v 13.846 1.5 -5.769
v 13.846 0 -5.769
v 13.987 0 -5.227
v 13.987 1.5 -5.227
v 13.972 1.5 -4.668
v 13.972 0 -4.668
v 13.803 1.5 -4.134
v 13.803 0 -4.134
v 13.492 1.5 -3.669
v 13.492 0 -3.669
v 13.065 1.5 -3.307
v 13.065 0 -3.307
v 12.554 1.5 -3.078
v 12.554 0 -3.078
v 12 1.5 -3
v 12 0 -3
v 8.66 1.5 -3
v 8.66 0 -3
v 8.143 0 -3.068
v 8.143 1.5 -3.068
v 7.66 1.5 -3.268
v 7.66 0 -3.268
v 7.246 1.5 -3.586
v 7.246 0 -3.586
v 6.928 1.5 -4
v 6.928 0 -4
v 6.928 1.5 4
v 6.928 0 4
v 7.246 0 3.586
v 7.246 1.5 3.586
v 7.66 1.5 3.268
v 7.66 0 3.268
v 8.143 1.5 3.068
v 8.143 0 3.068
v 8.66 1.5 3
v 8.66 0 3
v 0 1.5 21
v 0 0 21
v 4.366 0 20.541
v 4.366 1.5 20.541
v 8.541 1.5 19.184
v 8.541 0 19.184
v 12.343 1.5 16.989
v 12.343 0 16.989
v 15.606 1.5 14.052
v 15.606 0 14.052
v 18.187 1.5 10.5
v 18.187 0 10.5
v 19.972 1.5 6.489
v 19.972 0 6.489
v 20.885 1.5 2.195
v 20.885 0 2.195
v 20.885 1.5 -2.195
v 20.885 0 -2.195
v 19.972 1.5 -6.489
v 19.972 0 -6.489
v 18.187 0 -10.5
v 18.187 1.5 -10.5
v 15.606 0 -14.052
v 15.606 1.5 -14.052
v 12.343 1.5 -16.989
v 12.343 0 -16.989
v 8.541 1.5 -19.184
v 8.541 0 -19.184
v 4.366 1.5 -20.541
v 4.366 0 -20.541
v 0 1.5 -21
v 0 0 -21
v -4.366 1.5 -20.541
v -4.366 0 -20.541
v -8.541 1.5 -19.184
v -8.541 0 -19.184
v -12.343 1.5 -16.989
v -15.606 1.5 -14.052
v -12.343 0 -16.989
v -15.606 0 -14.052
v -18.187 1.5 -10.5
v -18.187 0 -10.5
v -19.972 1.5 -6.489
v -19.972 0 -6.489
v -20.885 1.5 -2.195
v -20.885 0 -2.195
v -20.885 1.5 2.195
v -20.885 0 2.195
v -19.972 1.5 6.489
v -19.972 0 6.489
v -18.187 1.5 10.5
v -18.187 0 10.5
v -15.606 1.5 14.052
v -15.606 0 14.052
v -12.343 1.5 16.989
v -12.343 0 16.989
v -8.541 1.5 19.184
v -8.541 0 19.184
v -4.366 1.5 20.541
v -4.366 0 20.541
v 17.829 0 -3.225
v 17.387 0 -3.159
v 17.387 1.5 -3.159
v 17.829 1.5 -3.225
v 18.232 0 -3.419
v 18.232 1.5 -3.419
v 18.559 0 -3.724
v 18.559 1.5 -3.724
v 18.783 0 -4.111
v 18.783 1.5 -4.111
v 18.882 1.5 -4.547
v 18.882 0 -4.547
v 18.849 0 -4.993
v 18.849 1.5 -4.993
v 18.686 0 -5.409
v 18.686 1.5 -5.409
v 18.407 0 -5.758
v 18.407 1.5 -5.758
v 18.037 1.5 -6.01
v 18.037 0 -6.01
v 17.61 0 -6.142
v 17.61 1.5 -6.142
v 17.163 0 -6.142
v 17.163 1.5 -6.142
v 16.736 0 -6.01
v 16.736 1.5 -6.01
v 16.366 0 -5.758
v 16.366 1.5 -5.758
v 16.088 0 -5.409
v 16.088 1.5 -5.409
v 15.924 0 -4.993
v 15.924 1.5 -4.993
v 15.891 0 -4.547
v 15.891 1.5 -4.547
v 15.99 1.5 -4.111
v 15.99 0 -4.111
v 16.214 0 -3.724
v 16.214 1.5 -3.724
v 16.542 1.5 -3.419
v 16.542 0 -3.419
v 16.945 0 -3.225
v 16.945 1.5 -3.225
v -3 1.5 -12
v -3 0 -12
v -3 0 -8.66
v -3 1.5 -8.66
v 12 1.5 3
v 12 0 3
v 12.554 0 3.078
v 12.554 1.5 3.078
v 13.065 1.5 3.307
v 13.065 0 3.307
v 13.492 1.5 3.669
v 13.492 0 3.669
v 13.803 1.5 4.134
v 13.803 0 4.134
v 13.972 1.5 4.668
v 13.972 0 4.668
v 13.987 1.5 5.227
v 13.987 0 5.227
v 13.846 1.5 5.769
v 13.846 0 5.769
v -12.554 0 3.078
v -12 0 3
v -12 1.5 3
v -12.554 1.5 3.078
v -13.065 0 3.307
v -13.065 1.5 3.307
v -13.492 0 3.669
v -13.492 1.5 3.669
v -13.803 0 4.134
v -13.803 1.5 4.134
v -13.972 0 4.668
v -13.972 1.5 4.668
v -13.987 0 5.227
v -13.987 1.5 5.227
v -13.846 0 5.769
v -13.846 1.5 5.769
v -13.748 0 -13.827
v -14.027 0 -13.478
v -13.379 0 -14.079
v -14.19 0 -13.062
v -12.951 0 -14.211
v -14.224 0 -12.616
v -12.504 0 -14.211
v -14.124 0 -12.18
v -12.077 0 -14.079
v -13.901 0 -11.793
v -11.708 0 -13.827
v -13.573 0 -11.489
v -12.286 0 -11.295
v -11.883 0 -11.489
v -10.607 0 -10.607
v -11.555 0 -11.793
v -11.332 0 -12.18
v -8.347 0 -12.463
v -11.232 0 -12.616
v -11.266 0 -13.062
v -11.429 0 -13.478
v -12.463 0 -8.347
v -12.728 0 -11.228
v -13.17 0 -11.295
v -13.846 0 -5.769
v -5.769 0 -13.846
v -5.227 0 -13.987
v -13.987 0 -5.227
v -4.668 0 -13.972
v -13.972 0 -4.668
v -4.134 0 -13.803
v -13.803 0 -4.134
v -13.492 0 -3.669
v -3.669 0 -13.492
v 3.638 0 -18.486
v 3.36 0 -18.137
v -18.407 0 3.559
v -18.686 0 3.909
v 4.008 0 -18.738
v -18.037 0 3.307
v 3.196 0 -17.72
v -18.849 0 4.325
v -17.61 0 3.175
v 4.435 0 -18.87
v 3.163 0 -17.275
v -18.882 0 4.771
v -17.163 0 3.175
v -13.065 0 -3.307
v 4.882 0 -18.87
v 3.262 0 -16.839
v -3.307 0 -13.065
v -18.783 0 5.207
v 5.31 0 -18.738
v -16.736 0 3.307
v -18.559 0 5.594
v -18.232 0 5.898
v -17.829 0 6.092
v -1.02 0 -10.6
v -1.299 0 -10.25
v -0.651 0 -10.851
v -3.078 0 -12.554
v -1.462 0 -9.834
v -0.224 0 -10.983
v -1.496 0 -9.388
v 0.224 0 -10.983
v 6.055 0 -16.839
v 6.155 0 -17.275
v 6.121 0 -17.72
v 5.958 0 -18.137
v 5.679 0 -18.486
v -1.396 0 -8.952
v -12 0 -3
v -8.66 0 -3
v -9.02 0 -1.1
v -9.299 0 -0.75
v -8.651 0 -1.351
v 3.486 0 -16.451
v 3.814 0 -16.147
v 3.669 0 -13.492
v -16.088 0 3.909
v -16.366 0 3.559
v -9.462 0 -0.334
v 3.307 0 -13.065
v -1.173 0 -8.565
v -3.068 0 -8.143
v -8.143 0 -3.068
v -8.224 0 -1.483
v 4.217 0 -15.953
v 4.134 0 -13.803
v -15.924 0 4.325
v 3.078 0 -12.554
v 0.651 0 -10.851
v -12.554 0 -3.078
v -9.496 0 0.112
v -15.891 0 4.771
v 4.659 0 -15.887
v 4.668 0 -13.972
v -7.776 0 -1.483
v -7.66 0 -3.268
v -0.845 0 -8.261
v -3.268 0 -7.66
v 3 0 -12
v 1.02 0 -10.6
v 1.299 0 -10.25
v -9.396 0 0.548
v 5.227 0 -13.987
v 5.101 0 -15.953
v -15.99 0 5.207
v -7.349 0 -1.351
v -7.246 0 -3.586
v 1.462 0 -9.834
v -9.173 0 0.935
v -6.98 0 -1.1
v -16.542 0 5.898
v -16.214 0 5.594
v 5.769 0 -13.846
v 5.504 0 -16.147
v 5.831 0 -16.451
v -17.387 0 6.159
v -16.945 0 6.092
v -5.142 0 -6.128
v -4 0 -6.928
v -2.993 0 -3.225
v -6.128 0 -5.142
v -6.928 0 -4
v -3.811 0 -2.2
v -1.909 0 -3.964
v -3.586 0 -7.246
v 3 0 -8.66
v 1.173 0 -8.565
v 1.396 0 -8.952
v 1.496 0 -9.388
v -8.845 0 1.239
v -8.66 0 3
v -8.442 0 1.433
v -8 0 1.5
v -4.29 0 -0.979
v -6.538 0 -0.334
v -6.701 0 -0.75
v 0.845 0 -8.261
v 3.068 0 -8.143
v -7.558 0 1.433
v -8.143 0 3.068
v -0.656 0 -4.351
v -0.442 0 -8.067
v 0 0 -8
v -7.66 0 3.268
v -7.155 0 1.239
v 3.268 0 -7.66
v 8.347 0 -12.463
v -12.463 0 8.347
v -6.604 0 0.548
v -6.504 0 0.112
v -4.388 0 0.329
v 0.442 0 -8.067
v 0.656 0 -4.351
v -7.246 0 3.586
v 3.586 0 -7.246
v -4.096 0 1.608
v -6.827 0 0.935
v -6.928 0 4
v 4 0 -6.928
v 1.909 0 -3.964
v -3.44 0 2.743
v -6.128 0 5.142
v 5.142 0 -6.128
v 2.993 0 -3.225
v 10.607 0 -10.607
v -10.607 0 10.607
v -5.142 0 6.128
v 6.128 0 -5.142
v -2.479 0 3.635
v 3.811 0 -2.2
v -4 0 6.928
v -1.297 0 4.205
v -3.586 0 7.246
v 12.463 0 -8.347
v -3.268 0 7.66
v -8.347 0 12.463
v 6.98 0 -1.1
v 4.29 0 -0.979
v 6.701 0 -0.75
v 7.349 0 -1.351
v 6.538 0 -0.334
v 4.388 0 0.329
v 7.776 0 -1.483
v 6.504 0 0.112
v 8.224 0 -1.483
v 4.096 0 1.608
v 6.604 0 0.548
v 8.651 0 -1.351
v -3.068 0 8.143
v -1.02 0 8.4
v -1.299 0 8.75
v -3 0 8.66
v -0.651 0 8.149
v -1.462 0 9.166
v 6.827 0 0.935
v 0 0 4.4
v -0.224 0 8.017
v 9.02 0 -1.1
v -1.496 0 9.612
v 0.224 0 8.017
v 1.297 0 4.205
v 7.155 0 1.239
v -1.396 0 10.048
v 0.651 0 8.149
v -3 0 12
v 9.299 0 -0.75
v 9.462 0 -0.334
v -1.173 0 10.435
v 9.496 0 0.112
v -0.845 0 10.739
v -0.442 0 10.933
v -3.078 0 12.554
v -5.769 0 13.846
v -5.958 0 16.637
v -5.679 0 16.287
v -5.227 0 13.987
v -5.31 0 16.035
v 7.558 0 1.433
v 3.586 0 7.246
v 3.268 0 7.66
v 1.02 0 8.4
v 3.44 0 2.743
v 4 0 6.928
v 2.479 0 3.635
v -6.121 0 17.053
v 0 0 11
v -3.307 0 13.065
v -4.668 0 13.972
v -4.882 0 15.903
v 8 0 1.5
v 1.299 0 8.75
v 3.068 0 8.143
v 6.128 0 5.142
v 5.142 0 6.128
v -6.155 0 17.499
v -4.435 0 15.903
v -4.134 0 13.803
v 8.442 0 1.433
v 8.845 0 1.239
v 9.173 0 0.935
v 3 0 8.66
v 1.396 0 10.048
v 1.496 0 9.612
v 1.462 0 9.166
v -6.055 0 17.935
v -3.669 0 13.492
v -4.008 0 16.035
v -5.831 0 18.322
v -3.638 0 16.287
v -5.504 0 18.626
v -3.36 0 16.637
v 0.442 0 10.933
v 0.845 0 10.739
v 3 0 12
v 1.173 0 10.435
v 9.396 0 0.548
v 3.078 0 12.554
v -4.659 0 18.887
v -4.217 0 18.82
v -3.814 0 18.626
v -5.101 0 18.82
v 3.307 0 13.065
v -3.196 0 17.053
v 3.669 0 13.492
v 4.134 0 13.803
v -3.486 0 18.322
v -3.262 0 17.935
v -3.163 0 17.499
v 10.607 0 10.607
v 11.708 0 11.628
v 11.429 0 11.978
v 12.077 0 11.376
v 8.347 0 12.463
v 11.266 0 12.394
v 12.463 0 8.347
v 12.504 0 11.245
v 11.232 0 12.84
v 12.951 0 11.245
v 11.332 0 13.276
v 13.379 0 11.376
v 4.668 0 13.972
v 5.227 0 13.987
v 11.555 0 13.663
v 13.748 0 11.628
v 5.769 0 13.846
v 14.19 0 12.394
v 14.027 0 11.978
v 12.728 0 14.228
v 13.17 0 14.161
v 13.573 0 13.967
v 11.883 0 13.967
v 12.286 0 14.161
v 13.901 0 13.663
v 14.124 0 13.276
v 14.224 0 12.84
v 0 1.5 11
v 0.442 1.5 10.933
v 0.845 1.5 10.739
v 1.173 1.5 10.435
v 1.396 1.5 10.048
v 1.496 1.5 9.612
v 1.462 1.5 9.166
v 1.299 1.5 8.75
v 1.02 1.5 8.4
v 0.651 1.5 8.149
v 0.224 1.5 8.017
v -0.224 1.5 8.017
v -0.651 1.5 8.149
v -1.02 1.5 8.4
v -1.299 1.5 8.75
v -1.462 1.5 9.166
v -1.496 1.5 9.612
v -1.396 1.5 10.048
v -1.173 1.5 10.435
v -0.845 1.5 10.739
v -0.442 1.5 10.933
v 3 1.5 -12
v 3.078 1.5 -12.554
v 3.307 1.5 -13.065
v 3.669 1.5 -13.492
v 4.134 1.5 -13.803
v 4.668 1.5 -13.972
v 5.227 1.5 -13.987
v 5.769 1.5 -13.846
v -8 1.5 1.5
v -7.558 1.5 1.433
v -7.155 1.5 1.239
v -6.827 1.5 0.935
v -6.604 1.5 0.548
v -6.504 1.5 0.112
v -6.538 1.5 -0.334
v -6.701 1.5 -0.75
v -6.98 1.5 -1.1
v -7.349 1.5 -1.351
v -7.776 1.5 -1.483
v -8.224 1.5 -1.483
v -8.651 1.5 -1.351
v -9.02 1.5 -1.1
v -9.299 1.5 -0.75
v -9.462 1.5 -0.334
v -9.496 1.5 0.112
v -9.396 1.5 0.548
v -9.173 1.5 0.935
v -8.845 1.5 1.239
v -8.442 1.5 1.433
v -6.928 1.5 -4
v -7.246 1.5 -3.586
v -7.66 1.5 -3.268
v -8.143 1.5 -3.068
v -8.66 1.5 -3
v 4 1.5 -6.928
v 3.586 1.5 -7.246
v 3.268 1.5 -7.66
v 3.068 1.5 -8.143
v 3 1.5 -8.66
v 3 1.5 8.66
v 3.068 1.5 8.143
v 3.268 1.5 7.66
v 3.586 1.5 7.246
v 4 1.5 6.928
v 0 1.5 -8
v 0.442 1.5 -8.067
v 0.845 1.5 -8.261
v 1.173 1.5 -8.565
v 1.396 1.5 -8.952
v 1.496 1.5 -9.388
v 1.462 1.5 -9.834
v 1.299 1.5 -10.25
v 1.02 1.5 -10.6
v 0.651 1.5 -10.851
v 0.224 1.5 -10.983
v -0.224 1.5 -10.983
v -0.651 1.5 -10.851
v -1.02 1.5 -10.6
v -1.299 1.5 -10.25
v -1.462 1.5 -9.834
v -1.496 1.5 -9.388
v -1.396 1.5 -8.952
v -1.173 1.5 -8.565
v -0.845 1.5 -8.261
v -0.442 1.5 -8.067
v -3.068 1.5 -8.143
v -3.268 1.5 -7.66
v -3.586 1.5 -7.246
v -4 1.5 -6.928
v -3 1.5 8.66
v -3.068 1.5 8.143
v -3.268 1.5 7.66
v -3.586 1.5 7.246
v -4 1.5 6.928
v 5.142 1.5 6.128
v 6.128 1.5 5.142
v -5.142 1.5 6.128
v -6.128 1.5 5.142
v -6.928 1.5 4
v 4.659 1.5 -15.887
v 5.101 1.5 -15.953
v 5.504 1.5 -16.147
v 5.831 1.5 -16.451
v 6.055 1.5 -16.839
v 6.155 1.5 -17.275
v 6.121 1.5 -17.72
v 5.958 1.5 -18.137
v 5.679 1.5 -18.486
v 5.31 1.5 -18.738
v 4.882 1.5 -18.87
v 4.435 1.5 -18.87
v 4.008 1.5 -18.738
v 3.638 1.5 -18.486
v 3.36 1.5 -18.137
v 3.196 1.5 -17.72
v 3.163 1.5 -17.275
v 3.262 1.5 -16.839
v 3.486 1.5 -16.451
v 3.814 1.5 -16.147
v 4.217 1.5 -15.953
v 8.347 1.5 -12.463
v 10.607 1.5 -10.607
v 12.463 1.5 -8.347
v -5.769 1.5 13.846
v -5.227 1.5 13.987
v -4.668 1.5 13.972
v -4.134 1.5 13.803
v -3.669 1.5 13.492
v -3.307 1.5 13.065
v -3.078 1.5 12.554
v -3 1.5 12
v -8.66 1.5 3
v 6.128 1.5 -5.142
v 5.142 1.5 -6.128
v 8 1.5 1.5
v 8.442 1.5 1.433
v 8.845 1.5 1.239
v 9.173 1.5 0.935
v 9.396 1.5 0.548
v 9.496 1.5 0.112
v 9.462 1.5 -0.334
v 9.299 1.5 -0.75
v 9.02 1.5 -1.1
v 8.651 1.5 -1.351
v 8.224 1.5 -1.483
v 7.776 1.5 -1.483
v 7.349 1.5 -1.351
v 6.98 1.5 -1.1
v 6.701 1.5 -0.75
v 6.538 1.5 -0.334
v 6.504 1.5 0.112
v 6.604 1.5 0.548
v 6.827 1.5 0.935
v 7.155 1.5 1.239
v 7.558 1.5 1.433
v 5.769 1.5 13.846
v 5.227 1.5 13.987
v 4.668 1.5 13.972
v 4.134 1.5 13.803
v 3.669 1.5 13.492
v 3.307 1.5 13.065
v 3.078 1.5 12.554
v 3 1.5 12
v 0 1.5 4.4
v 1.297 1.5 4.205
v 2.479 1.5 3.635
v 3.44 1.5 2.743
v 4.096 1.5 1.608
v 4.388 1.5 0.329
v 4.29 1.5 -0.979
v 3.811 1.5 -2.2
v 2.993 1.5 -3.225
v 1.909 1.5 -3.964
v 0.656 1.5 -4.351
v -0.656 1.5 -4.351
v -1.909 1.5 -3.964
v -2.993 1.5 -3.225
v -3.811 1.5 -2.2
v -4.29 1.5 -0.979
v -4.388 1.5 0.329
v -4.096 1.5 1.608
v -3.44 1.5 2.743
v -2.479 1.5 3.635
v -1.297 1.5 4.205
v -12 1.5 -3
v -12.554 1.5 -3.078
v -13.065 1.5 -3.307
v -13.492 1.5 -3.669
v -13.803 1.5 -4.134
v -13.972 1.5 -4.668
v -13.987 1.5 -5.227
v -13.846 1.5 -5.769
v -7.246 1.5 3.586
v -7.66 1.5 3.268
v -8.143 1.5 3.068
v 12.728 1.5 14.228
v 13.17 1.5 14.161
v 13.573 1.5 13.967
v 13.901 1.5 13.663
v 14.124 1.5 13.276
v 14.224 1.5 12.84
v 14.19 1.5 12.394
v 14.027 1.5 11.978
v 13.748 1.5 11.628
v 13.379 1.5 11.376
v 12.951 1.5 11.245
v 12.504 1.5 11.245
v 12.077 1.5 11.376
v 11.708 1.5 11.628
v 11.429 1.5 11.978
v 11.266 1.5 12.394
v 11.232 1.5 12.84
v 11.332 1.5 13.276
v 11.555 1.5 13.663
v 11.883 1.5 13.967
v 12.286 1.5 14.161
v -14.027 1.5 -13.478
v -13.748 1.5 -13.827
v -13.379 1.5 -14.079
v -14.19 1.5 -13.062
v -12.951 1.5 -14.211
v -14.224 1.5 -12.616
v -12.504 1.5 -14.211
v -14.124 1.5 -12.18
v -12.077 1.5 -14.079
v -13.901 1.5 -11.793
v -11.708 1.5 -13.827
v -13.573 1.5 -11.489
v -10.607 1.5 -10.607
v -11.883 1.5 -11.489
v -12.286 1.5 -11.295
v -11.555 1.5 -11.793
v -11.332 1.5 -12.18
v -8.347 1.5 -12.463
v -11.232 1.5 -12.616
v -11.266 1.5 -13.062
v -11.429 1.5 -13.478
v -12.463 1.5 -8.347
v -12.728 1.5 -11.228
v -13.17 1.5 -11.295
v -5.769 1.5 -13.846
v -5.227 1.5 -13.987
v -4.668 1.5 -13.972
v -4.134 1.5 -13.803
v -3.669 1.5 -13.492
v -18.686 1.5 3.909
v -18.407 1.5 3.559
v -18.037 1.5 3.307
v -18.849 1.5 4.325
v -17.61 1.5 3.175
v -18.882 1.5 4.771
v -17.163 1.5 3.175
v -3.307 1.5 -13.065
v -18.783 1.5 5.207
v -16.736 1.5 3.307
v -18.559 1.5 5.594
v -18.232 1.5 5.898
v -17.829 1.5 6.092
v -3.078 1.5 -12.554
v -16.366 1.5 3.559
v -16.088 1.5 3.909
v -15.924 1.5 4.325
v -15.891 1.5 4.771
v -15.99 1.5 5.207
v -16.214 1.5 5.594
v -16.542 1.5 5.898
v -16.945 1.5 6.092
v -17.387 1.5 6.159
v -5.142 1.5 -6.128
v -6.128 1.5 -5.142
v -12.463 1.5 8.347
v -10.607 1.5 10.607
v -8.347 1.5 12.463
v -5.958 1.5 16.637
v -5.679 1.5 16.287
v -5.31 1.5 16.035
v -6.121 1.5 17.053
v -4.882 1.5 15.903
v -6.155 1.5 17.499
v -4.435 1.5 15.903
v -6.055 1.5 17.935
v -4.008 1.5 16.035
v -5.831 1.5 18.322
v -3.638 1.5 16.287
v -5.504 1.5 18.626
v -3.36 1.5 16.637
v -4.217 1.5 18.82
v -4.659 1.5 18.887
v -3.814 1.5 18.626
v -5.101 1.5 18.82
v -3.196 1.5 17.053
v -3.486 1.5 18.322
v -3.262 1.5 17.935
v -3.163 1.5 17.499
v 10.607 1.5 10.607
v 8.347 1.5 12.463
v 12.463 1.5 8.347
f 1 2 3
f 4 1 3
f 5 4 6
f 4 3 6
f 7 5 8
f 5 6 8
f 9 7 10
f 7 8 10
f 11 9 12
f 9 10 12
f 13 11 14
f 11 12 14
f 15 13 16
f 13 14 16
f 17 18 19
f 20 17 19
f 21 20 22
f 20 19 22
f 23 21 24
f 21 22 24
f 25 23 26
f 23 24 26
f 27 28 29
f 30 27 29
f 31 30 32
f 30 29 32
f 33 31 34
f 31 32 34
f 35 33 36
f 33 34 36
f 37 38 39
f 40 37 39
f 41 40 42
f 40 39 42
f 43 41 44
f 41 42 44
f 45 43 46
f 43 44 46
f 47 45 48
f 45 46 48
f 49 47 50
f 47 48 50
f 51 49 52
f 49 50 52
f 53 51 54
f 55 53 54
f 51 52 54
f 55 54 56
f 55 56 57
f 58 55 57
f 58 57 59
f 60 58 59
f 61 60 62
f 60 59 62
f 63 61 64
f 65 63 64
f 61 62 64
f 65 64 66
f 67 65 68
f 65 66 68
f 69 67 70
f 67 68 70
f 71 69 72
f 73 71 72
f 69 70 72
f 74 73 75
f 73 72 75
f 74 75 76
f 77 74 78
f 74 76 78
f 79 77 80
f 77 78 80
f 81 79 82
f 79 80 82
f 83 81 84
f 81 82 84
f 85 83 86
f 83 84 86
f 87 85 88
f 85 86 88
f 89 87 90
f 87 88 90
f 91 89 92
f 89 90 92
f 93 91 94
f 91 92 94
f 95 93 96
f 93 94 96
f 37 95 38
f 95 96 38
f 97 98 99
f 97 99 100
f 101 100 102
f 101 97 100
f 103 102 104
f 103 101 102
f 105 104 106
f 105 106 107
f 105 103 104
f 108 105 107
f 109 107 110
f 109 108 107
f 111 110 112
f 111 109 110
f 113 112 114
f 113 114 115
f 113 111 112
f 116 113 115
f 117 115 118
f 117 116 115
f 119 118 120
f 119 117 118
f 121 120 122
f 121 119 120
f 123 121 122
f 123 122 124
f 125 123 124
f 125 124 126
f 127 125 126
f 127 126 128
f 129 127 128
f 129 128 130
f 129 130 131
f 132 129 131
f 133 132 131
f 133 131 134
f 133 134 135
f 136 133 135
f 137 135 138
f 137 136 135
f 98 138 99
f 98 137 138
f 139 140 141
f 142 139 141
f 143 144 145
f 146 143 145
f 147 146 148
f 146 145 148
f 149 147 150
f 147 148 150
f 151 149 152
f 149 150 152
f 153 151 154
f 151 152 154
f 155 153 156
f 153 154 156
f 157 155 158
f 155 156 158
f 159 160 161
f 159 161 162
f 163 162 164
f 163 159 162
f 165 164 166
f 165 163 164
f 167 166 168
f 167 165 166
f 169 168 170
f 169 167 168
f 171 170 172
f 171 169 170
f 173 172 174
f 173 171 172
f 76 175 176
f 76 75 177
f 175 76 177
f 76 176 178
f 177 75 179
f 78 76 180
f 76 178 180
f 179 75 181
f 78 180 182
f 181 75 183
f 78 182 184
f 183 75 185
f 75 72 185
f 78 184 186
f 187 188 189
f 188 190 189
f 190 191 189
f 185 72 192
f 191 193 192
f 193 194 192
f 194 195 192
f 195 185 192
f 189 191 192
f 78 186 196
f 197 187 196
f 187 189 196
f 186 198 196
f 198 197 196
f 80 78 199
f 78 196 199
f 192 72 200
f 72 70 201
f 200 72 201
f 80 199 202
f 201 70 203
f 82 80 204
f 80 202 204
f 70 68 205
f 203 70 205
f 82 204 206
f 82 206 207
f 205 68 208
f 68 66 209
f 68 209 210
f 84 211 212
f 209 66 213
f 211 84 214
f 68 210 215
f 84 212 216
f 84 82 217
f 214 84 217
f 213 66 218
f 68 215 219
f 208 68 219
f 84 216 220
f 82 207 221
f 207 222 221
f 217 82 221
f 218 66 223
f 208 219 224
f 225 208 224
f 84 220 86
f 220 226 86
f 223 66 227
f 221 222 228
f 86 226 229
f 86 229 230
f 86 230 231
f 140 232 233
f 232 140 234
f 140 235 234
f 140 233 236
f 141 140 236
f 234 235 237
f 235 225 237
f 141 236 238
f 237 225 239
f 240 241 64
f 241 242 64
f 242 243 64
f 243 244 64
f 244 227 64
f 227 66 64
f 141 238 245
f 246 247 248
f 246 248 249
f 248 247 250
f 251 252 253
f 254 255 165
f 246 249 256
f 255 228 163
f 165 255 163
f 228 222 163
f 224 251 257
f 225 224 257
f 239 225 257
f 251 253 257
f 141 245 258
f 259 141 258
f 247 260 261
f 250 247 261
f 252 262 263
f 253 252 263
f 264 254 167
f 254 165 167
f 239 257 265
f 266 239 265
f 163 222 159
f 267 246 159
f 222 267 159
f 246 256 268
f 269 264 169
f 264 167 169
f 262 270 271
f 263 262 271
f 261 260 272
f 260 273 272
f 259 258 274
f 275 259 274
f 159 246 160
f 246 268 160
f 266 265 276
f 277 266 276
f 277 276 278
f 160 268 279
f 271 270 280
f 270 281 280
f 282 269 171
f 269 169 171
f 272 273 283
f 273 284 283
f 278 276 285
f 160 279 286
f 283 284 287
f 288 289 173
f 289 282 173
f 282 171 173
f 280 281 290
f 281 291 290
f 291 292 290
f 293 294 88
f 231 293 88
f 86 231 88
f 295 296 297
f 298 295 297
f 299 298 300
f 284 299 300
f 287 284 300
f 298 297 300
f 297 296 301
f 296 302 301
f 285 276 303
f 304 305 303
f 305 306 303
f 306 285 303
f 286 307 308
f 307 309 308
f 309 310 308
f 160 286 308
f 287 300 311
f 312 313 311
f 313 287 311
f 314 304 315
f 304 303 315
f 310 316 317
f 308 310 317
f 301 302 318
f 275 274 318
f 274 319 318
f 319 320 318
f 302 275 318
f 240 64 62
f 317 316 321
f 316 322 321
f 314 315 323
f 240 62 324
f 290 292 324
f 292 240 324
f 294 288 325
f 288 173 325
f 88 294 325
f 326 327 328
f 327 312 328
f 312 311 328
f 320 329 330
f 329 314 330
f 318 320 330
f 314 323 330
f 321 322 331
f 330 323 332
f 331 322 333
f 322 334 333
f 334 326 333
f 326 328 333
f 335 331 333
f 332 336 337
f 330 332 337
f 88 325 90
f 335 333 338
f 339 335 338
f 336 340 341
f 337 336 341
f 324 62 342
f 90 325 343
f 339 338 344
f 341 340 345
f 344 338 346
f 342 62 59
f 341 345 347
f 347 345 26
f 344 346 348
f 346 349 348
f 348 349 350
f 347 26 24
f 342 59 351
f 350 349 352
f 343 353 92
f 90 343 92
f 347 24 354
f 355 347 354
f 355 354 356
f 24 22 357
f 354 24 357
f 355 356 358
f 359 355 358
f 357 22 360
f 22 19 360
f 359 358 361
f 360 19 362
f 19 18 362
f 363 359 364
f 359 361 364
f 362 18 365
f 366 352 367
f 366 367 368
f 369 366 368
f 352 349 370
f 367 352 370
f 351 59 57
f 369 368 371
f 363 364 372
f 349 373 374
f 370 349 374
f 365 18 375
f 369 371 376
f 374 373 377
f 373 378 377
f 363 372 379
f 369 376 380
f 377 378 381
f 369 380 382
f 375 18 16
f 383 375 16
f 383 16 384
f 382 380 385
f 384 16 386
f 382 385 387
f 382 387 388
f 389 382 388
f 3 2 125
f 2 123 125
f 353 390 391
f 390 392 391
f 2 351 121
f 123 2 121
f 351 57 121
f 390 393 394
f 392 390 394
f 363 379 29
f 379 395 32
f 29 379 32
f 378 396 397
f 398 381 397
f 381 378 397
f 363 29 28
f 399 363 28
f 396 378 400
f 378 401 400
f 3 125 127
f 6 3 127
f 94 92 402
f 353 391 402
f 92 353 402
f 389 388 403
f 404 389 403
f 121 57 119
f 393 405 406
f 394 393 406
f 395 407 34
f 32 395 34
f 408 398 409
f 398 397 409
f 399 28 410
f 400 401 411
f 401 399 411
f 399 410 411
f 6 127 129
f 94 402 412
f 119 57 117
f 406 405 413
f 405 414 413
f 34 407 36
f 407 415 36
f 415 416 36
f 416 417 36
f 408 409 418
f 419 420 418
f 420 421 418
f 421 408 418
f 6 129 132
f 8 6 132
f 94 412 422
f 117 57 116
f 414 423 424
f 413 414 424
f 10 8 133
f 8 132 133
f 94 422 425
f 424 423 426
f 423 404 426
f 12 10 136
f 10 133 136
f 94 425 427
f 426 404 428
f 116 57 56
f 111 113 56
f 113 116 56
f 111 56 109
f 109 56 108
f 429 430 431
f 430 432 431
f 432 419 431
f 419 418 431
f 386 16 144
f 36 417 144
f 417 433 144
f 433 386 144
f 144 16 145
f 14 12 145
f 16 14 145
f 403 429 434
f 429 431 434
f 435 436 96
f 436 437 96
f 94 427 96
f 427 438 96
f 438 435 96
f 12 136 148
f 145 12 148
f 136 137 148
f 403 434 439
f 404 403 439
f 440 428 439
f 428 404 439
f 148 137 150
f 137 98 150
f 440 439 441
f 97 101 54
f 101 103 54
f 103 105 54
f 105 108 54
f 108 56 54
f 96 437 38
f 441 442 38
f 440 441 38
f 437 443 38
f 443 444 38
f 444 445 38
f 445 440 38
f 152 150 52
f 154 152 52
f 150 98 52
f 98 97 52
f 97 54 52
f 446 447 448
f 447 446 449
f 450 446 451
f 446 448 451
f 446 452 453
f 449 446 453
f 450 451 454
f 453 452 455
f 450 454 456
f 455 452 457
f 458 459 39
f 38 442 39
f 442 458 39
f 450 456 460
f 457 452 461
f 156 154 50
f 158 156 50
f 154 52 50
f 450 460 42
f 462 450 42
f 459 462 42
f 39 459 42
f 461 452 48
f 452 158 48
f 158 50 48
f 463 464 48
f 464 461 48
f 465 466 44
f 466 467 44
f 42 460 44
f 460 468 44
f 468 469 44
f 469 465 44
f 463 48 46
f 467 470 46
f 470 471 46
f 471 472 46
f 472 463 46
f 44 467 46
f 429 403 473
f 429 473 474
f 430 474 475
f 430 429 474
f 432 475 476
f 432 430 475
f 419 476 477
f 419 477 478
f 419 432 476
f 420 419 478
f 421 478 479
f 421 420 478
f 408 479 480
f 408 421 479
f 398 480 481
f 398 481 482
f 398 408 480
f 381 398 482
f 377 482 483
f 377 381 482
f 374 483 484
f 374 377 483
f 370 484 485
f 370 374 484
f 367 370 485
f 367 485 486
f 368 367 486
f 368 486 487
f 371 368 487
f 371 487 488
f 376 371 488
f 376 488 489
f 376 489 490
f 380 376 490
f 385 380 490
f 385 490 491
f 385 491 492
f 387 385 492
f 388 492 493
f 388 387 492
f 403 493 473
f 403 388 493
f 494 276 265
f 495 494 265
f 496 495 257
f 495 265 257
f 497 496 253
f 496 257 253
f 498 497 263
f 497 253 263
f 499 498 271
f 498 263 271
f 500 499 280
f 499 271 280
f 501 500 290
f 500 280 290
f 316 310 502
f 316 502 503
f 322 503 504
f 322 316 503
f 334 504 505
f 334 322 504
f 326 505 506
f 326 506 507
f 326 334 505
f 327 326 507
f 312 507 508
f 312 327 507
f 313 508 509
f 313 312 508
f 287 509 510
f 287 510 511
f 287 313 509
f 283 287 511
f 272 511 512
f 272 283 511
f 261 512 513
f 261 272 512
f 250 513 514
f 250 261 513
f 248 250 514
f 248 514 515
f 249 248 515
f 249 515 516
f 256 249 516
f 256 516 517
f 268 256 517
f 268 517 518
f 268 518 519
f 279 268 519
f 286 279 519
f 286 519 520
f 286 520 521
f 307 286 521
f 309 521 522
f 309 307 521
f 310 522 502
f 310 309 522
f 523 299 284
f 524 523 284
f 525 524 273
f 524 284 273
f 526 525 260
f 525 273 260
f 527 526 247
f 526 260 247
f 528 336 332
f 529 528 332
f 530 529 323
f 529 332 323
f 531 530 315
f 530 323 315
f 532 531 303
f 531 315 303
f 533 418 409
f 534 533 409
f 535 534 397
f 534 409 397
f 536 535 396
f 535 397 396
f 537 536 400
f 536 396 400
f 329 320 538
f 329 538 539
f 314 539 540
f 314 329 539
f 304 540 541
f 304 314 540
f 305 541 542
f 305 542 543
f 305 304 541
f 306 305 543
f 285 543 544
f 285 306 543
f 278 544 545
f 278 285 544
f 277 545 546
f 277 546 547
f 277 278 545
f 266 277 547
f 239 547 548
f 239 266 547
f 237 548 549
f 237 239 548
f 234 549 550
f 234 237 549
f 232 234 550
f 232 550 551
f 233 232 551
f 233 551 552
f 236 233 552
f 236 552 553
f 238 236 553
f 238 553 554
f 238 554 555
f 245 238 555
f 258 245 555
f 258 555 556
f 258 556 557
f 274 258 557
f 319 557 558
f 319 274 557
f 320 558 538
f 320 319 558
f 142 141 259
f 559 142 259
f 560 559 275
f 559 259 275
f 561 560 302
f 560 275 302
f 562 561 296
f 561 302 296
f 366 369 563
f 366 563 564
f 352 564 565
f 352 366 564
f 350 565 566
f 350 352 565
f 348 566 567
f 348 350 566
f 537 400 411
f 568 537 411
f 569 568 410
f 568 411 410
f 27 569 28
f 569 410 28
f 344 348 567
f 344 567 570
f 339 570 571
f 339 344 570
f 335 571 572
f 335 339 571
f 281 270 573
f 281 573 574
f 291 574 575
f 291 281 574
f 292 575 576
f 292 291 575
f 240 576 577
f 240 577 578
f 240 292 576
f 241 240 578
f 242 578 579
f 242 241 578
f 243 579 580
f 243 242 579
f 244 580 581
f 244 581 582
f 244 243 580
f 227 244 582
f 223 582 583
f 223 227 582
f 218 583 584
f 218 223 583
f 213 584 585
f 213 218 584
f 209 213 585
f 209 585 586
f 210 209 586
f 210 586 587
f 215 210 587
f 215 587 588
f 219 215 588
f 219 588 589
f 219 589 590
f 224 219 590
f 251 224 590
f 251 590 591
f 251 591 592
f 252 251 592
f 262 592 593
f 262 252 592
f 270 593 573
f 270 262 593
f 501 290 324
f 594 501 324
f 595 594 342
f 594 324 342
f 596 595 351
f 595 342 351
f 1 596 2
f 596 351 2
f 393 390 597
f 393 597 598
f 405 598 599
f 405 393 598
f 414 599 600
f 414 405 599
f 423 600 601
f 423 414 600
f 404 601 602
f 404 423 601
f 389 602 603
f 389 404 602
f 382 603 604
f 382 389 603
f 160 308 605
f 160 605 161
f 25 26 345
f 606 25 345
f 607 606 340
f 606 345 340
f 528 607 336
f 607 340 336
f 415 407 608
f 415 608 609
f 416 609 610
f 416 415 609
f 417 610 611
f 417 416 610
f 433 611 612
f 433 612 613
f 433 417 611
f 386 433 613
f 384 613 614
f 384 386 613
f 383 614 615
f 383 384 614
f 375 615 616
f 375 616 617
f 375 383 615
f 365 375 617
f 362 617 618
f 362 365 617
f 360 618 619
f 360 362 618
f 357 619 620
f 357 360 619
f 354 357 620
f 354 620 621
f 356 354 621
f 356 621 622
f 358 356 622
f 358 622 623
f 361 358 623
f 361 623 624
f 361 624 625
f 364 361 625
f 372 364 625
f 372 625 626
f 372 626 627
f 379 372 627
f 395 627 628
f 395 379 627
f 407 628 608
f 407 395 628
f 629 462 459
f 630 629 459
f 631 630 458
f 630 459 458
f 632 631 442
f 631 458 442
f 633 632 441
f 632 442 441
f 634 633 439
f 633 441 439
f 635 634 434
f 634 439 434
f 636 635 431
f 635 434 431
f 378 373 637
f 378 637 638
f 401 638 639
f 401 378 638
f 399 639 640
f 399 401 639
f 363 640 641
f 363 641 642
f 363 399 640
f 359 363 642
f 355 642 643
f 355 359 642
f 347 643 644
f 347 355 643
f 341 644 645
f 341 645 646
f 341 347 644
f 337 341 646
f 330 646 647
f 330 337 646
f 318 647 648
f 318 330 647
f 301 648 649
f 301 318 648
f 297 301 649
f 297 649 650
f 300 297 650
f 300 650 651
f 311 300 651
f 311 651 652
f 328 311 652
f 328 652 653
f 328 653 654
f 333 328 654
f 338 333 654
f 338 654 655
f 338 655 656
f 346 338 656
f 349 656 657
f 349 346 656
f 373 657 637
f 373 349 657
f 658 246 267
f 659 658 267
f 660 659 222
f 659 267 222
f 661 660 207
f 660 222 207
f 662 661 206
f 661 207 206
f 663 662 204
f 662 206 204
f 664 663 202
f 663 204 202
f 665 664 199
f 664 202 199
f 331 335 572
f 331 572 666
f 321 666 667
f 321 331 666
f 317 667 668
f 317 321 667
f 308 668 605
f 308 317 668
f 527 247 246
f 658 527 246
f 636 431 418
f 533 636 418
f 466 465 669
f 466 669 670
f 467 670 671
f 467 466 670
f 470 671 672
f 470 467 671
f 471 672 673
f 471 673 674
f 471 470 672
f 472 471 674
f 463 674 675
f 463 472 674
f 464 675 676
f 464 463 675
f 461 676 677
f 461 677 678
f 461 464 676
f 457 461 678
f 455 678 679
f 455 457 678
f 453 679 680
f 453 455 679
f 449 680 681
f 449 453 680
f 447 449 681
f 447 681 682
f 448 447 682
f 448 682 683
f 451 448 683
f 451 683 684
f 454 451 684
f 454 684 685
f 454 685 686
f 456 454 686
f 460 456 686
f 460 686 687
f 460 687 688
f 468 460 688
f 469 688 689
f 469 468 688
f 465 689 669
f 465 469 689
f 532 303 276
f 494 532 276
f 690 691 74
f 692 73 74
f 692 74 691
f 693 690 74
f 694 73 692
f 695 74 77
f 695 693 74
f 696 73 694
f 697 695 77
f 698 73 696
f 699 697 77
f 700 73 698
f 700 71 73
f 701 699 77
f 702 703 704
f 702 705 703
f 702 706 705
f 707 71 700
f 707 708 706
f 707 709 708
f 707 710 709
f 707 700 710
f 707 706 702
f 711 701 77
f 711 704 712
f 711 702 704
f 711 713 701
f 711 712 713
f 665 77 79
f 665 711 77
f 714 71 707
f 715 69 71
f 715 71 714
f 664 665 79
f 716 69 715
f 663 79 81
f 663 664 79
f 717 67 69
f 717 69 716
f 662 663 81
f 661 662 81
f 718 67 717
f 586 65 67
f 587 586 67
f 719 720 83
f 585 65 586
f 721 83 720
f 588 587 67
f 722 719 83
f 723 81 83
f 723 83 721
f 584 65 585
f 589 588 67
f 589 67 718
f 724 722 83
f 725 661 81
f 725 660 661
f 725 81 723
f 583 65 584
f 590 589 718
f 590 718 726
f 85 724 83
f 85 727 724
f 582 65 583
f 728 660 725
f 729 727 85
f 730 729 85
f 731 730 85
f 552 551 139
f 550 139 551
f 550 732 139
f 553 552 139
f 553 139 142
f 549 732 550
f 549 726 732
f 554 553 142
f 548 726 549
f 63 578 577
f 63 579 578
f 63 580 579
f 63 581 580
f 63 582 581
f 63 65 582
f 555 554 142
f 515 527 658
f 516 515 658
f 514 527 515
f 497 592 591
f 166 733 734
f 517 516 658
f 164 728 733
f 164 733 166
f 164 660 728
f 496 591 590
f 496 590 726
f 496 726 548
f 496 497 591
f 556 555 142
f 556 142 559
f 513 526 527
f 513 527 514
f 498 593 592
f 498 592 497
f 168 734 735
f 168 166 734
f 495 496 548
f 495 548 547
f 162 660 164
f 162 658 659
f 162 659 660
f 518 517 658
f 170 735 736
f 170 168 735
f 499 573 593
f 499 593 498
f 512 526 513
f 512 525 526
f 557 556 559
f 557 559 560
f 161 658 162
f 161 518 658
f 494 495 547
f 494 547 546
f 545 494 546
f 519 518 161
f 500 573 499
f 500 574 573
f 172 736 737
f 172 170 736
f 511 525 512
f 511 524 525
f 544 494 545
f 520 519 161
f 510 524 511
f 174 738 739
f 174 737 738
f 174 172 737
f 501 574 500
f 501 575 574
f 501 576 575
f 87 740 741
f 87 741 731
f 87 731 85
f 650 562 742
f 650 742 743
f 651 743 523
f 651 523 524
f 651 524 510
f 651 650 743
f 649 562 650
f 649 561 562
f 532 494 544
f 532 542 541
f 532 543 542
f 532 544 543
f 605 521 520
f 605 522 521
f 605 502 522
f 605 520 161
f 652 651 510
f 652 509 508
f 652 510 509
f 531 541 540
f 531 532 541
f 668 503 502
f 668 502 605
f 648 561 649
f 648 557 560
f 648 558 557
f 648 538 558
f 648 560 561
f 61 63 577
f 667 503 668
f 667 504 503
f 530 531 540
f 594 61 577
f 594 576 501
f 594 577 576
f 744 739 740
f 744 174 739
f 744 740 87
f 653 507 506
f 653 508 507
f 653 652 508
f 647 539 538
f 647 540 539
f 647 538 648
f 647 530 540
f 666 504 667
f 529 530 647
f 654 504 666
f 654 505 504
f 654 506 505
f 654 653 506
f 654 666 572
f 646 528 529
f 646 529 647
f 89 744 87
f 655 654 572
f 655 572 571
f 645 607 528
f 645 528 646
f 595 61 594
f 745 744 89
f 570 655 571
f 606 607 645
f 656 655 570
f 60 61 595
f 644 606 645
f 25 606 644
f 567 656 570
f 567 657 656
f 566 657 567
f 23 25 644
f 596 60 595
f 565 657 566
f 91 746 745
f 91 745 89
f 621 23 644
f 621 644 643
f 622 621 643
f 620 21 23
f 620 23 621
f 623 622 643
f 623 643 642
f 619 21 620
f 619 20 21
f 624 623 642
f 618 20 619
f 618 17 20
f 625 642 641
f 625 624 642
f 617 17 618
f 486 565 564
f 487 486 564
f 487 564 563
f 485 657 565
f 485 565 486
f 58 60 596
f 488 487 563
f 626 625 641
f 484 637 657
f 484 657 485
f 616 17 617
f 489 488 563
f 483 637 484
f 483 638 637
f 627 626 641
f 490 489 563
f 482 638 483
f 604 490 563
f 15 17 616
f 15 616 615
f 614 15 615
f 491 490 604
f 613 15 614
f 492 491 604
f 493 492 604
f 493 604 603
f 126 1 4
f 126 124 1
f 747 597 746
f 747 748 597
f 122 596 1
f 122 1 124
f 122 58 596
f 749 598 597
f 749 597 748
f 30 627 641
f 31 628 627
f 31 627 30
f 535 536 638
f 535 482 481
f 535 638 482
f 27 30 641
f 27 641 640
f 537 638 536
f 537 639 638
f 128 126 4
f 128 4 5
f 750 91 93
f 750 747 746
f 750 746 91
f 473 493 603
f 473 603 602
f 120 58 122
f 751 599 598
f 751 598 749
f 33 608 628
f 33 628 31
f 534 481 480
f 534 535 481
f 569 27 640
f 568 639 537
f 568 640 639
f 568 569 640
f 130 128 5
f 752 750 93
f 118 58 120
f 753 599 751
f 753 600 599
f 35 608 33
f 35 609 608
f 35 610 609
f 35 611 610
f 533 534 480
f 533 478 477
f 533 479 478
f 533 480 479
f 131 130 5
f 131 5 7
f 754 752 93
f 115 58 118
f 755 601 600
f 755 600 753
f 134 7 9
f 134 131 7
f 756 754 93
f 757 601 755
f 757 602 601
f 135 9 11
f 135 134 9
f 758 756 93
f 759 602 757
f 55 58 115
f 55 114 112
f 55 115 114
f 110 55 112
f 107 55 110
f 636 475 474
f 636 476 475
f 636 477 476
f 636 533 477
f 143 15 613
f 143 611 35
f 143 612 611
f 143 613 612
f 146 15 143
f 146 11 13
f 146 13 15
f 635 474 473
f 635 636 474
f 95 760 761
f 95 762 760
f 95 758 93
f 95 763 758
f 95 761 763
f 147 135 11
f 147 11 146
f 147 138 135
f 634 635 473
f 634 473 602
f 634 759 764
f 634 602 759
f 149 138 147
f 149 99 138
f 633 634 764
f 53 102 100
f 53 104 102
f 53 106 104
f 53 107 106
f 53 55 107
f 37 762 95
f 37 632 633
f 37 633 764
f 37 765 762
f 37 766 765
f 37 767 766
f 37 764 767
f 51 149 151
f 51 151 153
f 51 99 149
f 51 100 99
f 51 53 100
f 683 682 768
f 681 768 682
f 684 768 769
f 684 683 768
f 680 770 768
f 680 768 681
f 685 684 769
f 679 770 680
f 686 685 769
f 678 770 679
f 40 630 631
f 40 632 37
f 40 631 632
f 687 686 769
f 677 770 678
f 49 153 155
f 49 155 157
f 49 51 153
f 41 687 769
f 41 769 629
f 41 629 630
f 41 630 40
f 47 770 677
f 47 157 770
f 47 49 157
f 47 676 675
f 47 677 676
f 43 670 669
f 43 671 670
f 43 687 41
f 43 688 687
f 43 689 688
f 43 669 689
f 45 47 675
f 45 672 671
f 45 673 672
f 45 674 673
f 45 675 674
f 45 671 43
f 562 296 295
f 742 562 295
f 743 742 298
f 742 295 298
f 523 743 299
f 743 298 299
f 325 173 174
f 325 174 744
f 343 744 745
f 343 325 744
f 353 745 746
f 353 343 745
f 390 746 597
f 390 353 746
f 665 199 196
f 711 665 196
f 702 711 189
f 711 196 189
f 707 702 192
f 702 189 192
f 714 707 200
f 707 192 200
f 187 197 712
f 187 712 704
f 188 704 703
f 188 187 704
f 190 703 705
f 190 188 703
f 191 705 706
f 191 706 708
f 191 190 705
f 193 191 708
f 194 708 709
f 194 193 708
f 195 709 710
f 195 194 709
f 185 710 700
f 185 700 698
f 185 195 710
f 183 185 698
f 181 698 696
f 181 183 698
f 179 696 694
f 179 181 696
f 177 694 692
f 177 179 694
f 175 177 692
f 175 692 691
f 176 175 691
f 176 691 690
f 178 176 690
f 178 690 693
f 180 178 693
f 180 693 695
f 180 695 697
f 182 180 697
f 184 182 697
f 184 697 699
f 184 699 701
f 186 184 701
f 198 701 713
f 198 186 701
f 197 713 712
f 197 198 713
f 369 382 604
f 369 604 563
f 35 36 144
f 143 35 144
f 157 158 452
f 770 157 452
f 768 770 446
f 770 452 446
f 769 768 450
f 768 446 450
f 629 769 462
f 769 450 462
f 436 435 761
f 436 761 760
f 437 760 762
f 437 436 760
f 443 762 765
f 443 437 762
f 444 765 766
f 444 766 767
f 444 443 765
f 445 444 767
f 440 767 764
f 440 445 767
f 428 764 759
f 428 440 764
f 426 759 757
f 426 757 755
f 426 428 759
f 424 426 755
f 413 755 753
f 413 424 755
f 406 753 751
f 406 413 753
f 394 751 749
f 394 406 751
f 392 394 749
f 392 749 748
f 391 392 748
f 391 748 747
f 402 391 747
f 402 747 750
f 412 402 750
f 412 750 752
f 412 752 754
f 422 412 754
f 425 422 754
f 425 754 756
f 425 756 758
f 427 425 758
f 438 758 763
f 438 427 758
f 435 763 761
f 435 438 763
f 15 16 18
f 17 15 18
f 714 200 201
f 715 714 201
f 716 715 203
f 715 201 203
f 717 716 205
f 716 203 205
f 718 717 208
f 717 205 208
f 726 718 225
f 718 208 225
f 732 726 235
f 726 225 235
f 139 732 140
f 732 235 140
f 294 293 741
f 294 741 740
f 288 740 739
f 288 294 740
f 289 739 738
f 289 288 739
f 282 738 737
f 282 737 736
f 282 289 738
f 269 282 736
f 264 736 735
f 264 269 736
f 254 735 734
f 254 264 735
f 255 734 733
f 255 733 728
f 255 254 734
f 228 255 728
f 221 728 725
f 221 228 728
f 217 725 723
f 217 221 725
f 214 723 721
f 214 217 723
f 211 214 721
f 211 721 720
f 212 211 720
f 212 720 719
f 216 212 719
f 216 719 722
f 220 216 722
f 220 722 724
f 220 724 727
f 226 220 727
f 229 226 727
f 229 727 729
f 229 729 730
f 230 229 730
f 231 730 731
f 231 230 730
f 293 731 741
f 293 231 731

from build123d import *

# Parameters (mm, degrees)
SKETCH1_R           = 21
SKETCH1_R_2         = 1.5
SKETCH1_R_3         = 4.4
BOSS_EXTRUDE1_DEPTH = 1.5


with BuildPart() as part:
    # Sketch1 → Boss-Extrude1 (new body)
    with BuildSketch(Plane(origin=(0, 0, 0), x_dir=(1, 0, 0), z_dir=(0, 1, 0))):
        with Locations(Location((0, 0, 0), (0, 0, 270))):
            Circle(SKETCH1_R)
        with Locations(Location((-8, 0, 0), (0, 0, 270))):
            Circle(SKETCH1_R_2, mode=Mode.SUBTRACT)
        with Locations(Location((8, 0, 0), (0, 0, 270))):
            Circle(SKETCH1_R_2, mode=Mode.SUBTRACT)
        with Locations(Location((0, 9.5, 0), (0, 0, 270))):
            Circle(SKETCH1_R_2, mode=Mode.SUBTRACT)
        with Locations(Location((0, -9.5, 0), (0, 0, 270))):
            Circle(SKETCH1_R_2, mode=Mode.SUBTRACT)
        with Locations(Location((-12.727922061, 12.727922061, 0), (0, 0, 270))):
            Circle(SKETCH1_R_2, mode=Mode.SUBTRACT)
        with Locations(Location((4.658742812, 17.386664873, 0), (0, 0, 270))):
            Circle(SKETCH1_R_2, mode=Mode.SUBTRACT)
        with Locations(Location((17.386664873, 4.658742812, 0), (0, 0, 270))):
            Circle(SKETCH1_R_2, mode=Mode.SUBTRACT)
        with Locations(Location((12.727922061, -12.727922061, 0), (0, 0, 270))):
            Circle(SKETCH1_R_2, mode=Mode.SUBTRACT)
        with Locations(Location((-4.658742812, -17.386664873, 0), (0, 0, 270))):
            Circle(SKETCH1_R_2, mode=Mode.SUBTRACT)
        with Locations(Location((0, 0, 0), (0, 0, 270))):
            Circle(SKETCH1_R_3, mode=Mode.SUBTRACT)
        with Locations(Location((-17.386664873, -4.658742812, 0), (0, 0, 270))):
            Circle(SKETCH1_R_2, mode=Mode.SUBTRACT)
        with BuildLine():
            Line((-8.660254038, 3), (-12, 3))
            ThreePointArc((-12, 3), (-13.664100589, 3.890599608), (-13.846153846, 5.769230769))
            ThreePointArc((-13.846153846, 5.769230769), (-10.606601718, 10.606601718), (-5.769230769, 13.846153846))
            ThreePointArc((-5.769230769, 13.846153846), (-3.890599608, 13.664100589), (-3, 12))
            Line((-3, 12), (-3, 8.660254038))
            ThreePointArc((-3, 8.660254038), (-3.267949192, 7.660254038), (-4, 6.92820323))
            ThreePointArc((-4, 6.92820323), (-5.656854249, 5.656854249), (-6.92820323, 4))
            ThreePointArc((-6.92820323, 4), (-7.660254038, 3.267949192), (-8.660254038, 3))
        make_face(mode=Mode.SUBTRACT)
        with BuildLine():
            Line((-8.660254038, -3), (-12, -3))
            ThreePointArc((-12, -3), (-13.664100589, -3.890599608), (-13.846153846, -5.769230769))
            ThreePointArc((-13.846153846, -5.769230769), (-10.606601718, -10.606601718), (-5.769230769, -13.846153846))
            ThreePointArc((-5.769230769, -13.846153846), (-3.890599608, -13.664100589), (-3, -12))
            Line((-3, -12), (-3, -8.660254038))
            ThreePointArc((-3, -8.660254038), (-3.267949192, -7.660254038), (-4, -6.92820323))
            ThreePointArc((-4, -6.92820323), (-5.656854249, -5.656854249), (-6.92820323, -4))
            ThreePointArc((-6.92820323, -4), (-7.660254038, -3.267949192), (-8.660254038, -3))
        make_face(mode=Mode.SUBTRACT)
        with BuildLine():
            Line((3, 8.660254038), (3, 12))
            ThreePointArc((3, 12), (3.890599608, 13.664100589), (5.769230769, 13.846153846))
            ThreePointArc((5.769230769, 13.846153846), (10.606601718, 10.606601718), (13.846153846, 5.769230769))
            ThreePointArc((13.846153846, 5.769230769), (13.664100589, 3.890599608), (12, 3))
            Line((12, 3), (8.660254038, 3))
            ThreePointArc((8.660254038, 3), (7.660254038, 3.267949192), (6.92820323, 4))
            ThreePointArc((6.92820323, 4), (5.656854249, 5.656854249), (4, 6.92820323))
            ThreePointArc((4, 6.92820323), (3.267949192, 7.660254038), (3, 8.660254038))
        make_face(mode=Mode.SUBTRACT)
        with BuildLine():
            Line((8.660254038, -3), (12, -3))
            ThreePointArc((12, -3), (13.664100589, -3.890599608), (13.846153846, -5.769230769))
            ThreePointArc((13.846153846, -5.769230769), (10.606601718, -10.606601718), (5.769230769, -13.846153846))
            ThreePointArc((5.769230769, -13.846153846), (3.890599608, -13.664100589), (3, -12))
            Line((3, -12), (3, -8.660254038))
            ThreePointArc((3, -8.660254038), (3.267949192, -7.660254038), (4, -6.92820323))
            ThreePointArc((4, -6.92820323), (5.656854249, -5.656854249), (6.92820323, -4))
            ThreePointArc((6.92820323, -4), (7.660254038, -3.267949192), (8.660254038, -3))
        make_face(mode=Mode.SUBTRACT)
    extrude(amount=BOSS_EXTRUDE1_DEPTH)


solid = part.part
